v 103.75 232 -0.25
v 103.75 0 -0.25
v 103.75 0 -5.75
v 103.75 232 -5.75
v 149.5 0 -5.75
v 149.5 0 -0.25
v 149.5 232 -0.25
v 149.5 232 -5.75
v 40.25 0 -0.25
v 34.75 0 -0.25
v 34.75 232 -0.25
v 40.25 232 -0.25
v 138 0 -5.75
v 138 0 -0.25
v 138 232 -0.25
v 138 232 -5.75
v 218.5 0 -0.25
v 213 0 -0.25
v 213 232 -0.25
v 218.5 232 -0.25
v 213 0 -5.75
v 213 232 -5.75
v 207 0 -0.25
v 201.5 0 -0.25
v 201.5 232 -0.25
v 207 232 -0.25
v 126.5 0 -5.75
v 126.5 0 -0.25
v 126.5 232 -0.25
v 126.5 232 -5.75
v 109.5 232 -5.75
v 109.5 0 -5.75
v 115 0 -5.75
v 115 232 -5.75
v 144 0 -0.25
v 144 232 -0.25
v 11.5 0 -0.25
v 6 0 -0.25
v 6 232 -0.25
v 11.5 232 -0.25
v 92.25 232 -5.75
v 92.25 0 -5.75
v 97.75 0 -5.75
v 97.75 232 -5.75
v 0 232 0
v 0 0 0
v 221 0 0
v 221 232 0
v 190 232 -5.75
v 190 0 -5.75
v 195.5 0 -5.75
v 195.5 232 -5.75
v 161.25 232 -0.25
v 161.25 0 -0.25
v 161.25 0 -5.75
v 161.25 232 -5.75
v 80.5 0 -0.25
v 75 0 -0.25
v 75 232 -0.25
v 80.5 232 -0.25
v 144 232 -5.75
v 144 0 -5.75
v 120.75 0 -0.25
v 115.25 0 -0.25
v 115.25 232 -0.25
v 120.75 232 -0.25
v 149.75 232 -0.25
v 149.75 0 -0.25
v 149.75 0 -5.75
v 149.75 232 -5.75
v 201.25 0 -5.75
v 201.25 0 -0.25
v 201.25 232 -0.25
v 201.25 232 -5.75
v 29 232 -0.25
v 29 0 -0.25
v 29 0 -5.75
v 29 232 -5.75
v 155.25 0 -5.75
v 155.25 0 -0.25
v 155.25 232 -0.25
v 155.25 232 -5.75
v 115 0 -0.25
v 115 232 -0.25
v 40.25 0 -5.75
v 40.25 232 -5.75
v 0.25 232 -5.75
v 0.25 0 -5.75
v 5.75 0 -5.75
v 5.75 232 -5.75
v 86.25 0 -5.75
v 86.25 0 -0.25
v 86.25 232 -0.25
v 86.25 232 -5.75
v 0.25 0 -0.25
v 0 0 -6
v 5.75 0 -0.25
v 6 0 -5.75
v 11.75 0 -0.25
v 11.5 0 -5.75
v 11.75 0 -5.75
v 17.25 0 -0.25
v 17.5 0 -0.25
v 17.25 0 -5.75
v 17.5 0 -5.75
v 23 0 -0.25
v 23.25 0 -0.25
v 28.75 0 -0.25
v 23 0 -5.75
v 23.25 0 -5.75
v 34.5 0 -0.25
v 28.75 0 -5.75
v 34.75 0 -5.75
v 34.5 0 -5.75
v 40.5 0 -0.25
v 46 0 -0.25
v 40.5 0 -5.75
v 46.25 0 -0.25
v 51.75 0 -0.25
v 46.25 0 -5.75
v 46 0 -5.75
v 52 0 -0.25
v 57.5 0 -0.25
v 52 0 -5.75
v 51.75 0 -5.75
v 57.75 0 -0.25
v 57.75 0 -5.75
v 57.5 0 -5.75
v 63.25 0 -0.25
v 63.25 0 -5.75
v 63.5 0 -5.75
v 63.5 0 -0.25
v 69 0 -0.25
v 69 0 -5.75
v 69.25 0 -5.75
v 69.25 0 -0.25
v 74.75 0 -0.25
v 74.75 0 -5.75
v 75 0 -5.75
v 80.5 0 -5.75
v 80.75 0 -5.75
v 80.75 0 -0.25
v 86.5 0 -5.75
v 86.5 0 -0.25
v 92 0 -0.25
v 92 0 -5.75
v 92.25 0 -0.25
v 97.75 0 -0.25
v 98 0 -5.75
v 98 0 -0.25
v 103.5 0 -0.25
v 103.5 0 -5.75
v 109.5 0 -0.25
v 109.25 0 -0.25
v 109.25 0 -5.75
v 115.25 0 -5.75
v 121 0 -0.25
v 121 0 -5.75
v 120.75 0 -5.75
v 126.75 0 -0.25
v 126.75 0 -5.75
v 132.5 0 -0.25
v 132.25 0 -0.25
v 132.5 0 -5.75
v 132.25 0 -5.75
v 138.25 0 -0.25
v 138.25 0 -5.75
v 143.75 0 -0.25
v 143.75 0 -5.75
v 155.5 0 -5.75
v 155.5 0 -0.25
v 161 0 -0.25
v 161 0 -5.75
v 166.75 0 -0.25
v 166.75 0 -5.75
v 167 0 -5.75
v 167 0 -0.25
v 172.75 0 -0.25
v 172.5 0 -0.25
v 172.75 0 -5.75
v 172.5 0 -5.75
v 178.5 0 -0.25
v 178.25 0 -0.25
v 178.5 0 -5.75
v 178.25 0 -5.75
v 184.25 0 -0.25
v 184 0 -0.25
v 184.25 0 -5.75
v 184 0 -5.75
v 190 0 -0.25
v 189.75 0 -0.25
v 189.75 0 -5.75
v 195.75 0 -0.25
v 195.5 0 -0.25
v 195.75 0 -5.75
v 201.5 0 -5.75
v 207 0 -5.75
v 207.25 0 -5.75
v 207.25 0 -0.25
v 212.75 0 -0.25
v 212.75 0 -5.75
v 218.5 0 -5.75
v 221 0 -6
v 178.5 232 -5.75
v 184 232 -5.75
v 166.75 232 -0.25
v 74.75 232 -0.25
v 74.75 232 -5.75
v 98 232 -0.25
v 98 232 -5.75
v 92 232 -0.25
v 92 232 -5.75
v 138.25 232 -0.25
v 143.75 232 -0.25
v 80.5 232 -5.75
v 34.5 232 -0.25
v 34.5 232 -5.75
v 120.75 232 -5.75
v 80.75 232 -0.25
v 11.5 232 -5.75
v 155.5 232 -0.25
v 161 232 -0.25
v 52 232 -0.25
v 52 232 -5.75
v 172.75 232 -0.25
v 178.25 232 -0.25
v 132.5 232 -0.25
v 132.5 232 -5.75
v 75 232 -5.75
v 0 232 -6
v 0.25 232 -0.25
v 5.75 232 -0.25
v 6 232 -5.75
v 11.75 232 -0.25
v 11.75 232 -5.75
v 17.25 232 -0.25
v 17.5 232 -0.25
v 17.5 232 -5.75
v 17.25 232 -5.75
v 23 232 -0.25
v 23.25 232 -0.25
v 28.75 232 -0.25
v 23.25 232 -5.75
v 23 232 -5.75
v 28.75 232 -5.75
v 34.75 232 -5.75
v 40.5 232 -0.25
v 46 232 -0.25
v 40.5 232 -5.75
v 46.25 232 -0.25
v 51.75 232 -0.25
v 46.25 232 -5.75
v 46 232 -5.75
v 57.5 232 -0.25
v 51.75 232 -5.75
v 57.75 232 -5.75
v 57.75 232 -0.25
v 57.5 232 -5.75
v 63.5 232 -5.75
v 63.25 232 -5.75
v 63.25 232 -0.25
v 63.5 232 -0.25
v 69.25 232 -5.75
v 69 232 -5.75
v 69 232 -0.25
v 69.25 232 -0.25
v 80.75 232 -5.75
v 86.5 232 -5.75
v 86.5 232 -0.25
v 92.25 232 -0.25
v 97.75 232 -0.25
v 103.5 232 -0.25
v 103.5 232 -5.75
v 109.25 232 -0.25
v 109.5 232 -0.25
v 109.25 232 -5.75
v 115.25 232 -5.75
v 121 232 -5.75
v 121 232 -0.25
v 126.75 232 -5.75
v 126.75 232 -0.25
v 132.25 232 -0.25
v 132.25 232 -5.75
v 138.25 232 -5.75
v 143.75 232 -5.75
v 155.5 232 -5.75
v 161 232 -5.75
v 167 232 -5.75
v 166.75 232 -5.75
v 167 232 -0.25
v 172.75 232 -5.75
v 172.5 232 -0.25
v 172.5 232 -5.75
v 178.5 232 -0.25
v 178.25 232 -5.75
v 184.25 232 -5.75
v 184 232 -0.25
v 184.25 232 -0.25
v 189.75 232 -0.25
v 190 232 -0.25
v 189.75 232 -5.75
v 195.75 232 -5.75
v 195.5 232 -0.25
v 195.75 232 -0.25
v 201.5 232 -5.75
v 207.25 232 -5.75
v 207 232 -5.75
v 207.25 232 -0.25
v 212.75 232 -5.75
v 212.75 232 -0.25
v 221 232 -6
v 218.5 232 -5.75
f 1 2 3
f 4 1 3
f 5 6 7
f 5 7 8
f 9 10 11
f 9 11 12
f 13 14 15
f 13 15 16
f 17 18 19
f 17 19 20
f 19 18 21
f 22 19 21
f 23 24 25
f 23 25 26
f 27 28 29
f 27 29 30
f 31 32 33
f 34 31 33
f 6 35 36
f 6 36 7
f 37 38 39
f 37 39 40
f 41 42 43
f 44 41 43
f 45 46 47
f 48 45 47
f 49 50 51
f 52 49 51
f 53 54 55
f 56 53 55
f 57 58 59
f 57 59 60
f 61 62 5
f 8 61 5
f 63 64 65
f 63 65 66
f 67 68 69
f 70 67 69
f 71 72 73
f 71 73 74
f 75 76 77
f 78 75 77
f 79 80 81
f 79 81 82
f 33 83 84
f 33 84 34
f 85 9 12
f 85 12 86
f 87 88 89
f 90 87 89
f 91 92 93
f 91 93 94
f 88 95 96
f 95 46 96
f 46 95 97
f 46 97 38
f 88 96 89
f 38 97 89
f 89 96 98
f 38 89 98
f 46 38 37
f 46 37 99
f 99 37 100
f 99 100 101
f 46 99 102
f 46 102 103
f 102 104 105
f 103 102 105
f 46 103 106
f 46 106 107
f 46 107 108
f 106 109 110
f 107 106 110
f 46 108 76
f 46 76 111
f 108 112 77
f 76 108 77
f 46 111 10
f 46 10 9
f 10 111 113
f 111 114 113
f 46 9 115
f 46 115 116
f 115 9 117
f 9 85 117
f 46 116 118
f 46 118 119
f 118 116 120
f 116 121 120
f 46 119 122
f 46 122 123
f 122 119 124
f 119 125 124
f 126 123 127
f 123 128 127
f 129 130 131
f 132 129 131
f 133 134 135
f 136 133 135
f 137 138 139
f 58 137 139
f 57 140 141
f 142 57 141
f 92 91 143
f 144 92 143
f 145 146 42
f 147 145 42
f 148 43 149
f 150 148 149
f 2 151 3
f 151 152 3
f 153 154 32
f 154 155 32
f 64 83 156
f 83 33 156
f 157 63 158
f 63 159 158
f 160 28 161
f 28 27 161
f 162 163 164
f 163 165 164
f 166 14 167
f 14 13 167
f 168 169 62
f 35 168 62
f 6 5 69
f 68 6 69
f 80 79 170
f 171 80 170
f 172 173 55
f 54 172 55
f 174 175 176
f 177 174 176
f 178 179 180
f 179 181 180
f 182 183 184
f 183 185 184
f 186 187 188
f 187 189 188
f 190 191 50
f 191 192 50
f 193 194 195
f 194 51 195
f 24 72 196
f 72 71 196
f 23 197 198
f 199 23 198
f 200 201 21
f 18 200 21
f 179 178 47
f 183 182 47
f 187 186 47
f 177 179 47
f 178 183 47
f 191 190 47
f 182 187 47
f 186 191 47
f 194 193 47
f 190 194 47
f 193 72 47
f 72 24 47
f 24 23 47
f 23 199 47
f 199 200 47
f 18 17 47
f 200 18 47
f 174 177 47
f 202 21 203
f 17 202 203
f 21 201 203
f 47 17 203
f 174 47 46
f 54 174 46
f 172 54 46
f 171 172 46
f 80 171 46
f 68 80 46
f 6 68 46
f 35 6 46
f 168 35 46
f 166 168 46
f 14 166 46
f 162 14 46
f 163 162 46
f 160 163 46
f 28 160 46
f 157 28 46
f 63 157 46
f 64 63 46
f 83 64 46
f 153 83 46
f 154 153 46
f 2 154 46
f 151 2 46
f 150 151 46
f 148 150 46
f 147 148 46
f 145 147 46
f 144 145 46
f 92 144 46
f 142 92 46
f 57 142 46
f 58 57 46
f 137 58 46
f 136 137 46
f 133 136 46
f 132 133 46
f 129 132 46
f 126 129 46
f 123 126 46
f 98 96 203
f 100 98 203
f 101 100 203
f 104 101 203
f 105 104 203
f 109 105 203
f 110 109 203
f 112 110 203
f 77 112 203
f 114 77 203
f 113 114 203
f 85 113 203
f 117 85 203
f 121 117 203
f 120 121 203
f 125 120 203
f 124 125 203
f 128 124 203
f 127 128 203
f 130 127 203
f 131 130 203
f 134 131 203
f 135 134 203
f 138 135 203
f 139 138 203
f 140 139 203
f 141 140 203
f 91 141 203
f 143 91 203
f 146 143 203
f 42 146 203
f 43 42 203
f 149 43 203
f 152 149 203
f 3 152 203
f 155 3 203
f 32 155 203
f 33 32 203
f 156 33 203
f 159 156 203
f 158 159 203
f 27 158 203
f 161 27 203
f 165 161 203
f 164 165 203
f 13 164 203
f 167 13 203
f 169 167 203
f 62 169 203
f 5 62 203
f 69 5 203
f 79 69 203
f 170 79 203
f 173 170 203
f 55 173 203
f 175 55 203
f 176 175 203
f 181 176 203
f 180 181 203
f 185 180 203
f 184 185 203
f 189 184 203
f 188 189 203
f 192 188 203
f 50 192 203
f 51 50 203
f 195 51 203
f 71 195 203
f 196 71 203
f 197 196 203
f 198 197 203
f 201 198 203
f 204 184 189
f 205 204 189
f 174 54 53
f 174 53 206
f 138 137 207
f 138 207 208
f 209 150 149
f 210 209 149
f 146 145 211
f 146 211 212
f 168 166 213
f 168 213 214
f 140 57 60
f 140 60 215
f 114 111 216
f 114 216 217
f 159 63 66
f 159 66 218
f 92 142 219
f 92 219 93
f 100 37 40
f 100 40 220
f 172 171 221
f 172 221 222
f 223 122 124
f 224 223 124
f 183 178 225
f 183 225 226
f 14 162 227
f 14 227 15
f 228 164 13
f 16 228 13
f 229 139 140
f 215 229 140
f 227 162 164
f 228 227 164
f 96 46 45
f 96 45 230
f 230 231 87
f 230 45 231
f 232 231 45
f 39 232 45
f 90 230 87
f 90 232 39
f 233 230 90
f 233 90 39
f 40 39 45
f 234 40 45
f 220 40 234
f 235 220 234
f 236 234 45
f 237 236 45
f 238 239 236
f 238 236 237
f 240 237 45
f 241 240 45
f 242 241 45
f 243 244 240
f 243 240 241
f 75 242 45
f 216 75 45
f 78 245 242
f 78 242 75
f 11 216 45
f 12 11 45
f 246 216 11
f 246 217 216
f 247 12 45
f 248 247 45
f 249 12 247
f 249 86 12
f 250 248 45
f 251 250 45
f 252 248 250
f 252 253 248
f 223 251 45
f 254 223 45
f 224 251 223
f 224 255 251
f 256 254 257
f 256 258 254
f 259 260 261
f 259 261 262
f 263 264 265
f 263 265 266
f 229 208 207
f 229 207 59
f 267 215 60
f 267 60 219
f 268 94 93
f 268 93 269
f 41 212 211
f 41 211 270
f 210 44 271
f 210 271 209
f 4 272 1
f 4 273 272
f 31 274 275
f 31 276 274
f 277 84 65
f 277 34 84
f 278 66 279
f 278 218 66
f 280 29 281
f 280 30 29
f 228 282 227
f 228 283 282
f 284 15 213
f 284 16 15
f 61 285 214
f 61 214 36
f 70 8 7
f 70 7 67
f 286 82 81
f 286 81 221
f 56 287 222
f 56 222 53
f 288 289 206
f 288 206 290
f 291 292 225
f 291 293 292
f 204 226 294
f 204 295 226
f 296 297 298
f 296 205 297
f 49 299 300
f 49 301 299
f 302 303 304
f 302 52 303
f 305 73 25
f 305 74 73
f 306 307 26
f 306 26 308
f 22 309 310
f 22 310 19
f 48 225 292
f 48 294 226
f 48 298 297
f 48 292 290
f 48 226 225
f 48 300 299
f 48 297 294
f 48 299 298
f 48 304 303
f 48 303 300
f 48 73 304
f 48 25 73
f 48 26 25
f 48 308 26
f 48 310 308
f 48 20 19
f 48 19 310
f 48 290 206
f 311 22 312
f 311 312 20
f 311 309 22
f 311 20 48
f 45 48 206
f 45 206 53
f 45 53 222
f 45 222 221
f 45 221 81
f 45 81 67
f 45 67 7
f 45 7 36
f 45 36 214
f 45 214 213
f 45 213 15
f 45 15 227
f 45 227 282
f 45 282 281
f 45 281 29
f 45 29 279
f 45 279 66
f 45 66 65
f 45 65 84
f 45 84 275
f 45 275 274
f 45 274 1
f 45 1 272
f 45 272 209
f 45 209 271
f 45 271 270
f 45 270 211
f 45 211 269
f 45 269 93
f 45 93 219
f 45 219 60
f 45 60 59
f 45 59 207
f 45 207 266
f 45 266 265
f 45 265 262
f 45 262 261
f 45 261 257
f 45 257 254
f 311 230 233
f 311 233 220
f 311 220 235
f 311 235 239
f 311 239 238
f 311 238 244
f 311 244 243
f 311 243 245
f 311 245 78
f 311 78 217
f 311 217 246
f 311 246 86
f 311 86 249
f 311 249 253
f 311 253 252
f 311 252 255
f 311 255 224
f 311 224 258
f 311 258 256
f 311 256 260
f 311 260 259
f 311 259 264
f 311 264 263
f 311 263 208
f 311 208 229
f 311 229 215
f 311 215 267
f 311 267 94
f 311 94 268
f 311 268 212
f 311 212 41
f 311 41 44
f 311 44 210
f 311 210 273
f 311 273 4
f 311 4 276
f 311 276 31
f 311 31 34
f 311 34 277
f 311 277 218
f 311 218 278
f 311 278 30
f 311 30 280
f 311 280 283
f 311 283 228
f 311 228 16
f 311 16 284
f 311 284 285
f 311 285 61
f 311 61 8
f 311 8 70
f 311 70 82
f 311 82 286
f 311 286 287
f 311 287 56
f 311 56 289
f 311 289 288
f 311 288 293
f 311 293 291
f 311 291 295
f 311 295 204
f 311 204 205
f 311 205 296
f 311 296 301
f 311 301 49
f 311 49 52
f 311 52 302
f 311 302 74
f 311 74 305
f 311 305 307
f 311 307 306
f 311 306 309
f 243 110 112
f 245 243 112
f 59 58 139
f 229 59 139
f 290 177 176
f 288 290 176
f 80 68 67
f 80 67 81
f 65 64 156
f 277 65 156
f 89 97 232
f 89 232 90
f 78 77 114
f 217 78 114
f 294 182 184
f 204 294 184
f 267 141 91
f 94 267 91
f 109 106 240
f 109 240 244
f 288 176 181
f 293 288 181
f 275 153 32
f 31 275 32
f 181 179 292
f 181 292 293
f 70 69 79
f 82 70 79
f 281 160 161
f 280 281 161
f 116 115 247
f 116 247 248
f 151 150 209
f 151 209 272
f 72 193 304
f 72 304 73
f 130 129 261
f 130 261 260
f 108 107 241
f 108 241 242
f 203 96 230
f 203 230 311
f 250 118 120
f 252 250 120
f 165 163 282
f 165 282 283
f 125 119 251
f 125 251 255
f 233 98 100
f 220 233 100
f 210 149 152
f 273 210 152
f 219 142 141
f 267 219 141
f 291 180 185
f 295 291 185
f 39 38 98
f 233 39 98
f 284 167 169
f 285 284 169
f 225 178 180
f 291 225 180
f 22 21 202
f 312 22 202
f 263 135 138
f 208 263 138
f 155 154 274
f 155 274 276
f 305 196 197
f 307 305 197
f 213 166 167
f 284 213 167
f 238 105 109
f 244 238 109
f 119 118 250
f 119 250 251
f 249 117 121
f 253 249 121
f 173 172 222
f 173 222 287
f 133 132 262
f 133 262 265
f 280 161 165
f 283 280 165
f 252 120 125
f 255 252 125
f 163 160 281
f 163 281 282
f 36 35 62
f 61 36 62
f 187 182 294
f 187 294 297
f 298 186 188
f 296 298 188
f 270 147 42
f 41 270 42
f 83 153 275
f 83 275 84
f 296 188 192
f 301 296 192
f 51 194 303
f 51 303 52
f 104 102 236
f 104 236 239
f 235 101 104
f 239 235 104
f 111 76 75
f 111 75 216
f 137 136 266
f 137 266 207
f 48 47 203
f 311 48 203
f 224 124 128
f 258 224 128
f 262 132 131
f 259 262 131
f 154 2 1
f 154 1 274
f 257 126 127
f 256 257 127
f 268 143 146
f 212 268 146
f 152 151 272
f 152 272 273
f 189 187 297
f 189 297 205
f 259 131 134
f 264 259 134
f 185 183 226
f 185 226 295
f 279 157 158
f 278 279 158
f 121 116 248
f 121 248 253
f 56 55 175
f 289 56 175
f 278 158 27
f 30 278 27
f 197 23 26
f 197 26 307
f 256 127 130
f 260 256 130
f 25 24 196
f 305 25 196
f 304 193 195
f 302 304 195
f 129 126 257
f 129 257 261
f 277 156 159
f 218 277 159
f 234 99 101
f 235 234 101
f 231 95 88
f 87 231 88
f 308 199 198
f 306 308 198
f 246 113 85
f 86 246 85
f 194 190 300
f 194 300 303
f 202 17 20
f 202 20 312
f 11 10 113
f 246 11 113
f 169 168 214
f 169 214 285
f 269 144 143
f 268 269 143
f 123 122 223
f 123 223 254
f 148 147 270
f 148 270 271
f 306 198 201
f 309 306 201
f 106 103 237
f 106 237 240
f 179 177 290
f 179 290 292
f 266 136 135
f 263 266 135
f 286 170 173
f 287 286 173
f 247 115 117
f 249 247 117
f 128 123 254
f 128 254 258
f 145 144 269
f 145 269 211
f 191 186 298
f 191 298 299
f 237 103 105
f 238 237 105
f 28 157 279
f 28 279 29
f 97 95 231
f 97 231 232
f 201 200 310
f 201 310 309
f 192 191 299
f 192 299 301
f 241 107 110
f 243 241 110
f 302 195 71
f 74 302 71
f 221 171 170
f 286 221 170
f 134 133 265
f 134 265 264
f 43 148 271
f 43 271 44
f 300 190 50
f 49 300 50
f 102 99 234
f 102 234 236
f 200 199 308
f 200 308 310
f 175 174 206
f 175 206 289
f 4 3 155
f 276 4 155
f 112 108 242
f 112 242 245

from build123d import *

# Parameters (mm, degrees)
SKETCH1_W           = 221
SKETCH1_H           = 6
SKETCH1_W_2         = 5.5
SKETCH1_H_2         = 5.5
BOSS_EXTRUDE1_DEPTH = 232


with BuildPart() as part:
    # Sketch1 → Boss-Extrude1 (new body)
    with BuildSketch(Plane(origin=(0, 0, 0), x_dir=(1, 0, 0), z_dir=(0, 1, 0))):
        with Locations((110.5, 3)):
            Rectangle(SKETCH1_W, SKETCH1_H)
        with Locations((8.75, 3)):
            Rectangle(SKETCH1_W_2, SKETCH1_H_2, mode=Mode.SUBTRACT)
        with Locations((3, 3)):
            Rectangle(SKETCH1_W_2, SKETCH1_H_2, mode=Mode.SUBTRACT)
        with Locations((14.5, 3)):
            Rectangle(SKETCH1_W_2, SKETCH1_H_2, mode=Mode.SUBTRACT)
        with Locations((20.25, 3)):
            Rectangle(SKETCH1_W_2, SKETCH1_H_2, mode=Mode.SUBTRACT)
        with Locations((26, 3)):
            Rectangle(SKETCH1_W_2, SKETCH1_H_2, mode=Mode.SUBTRACT)
        with Locations((31.75, 3)):
            Rectangle(SKETCH1_W_2, SKETCH1_H_2, mode=Mode.SUBTRACT)
        with Locations((37.5, 3)):
            Rectangle(SKETCH1_W_2, SKETCH1_H_2, mode=Mode.SUBTRACT)
        with Locations((43.25, 3)):
            Rectangle(SKETCH1_W_2, SKETCH1_H_2, mode=Mode.SUBTRACT)
        with Locations((49, 3)):
            Rectangle(SKETCH1_W_2, SKETCH1_H_2, mode=Mode.SUBTRACT)
        with Locations((54.75, 3)):
            Rectangle(SKETCH1_W_2, SKETCH1_H_2, mode=Mode.SUBTRACT)
        with Locations((60.5, 3)):
            Rectangle(SKETCH1_W_2, SKETCH1_H_2, mode=Mode.SUBTRACT)
        with Locations((66.25, 3)):
            Rectangle(SKETCH1_W_2, SKETCH1_H_2, mode=Mode.SUBTRACT)
        with Locations((72, 3)):
            Rectangle(SKETCH1_W_2, SKETCH1_H_2, mode=Mode.SUBTRACT)
        with Locations((77.75, 3)):
            Rectangle(SKETCH1_W_2, SKETCH1_H_2, mode=Mode.SUBTRACT)
        with Locations((83.5, 3)):
            Rectangle(SKETCH1_W_2, SKETCH1_H_2, mode=Mode.SUBTRACT)
        with Locations((89.25, 3)):
            Rectangle(SKETCH1_W_2, SKETCH1_H_2, mode=Mode.SUBTRACT)
        with Locations((95, 3)):
            Rectangle(SKETCH1_W_2, SKETCH1_H_2, mode=Mode.SUBTRACT)
        with Locations((100.75, 3)):
            Rectangle(SKETCH1_W_2, SKETCH1_H_2, mode=Mode.SUBTRACT)
        with Locations((106.5, 3)):
            Rectangle(SKETCH1_W_2, SKETCH1_H_2, mode=Mode.SUBTRACT)
        with Locations((112.25, 3)):
            Rectangle(SKETCH1_W_2, SKETCH1_H_2, mode=Mode.SUBTRACT)
        with Locations((118, 3)):
            Rectangle(SKETCH1_W_2, SKETCH1_H_2, mode=Mode.SUBTRACT)
        with Locations((123.75, 3)):
            Rectangle(SKETCH1_W_2, SKETCH1_H_2, mode=Mode.SUBTRACT)
        with Locations((129.5, 3)):
            Rectangle(SKETCH1_W_2, SKETCH1_H_2, mode=Mode.SUBTRACT)
        with Locations((135.25, 3)):
            Rectangle(SKETCH1_W_2, SKETCH1_H_2, mode=Mode.SUBTRACT)
        with Locations((141, 3)):
            Rectangle(SKETCH1_W_2, SKETCH1_H_2, mode=Mode.SUBTRACT)
        with Locations((146.75, 3)):
            Rectangle(SKETCH1_W_2, SKETCH1_H_2, mode=Mode.SUBTRACT)
        with Locations((152.5, 3)):
            Rectangle(SKETCH1_W_2, SKETCH1_H_2, mode=Mode.SUBTRACT)
        with Locations((158.25, 3)):
            Rectangle(SKETCH1_W_2, SKETCH1_H_2, mode=Mode.SUBTRACT)
        with Locations((164, 3)):
            Rectangle(SKETCH1_W_2, SKETCH1_H_2, mode=Mode.SUBTRACT)
        with Locations((169.75, 3)):
            Rectangle(SKETCH1_W_2, SKETCH1_H_2, mode=Mode.SUBTRACT)
        with Locations((175.5, 3)):
            Rectangle(SKETCH1_W_2, SKETCH1_H_2, mode=Mode.SUBTRACT)
        with Locations((181.25, 3)):
            Rectangle(SKETCH1_W_2, SKETCH1_H_2, mode=Mode.SUBTRACT)
        with Locations((187, 3)):
            Rectangle(SKETCH1_W_2, SKETCH1_H_2, mode=Mode.SUBTRACT)
        with Locations((192.75, 3)):
            Rectangle(SKETCH1_W_2, SKETCH1_H_2, mode=Mode.SUBTRACT)
        with Locations((198.5, 3)):
            Rectangle(SKETCH1_W_2, SKETCH1_H_2, mode=Mode.SUBTRACT)
        with Locations((204.25, 3)):
            Rectangle(SKETCH1_W_2, SKETCH1_H_2, mode=Mode.SUBTRACT)
        with Locations((210, 3)):
            Rectangle(SKETCH1_W_2, SKETCH1_H_2, mode=Mode.SUBTRACT)
        with Locations((215.75, 3)):
            Rectangle(SKETCH1_W_2, SKETCH1_H_2, mode=Mode.SUBTRACT)
    extrude(amount=BOSS_EXTRUDE1_DEPTH)


solid = part.part
